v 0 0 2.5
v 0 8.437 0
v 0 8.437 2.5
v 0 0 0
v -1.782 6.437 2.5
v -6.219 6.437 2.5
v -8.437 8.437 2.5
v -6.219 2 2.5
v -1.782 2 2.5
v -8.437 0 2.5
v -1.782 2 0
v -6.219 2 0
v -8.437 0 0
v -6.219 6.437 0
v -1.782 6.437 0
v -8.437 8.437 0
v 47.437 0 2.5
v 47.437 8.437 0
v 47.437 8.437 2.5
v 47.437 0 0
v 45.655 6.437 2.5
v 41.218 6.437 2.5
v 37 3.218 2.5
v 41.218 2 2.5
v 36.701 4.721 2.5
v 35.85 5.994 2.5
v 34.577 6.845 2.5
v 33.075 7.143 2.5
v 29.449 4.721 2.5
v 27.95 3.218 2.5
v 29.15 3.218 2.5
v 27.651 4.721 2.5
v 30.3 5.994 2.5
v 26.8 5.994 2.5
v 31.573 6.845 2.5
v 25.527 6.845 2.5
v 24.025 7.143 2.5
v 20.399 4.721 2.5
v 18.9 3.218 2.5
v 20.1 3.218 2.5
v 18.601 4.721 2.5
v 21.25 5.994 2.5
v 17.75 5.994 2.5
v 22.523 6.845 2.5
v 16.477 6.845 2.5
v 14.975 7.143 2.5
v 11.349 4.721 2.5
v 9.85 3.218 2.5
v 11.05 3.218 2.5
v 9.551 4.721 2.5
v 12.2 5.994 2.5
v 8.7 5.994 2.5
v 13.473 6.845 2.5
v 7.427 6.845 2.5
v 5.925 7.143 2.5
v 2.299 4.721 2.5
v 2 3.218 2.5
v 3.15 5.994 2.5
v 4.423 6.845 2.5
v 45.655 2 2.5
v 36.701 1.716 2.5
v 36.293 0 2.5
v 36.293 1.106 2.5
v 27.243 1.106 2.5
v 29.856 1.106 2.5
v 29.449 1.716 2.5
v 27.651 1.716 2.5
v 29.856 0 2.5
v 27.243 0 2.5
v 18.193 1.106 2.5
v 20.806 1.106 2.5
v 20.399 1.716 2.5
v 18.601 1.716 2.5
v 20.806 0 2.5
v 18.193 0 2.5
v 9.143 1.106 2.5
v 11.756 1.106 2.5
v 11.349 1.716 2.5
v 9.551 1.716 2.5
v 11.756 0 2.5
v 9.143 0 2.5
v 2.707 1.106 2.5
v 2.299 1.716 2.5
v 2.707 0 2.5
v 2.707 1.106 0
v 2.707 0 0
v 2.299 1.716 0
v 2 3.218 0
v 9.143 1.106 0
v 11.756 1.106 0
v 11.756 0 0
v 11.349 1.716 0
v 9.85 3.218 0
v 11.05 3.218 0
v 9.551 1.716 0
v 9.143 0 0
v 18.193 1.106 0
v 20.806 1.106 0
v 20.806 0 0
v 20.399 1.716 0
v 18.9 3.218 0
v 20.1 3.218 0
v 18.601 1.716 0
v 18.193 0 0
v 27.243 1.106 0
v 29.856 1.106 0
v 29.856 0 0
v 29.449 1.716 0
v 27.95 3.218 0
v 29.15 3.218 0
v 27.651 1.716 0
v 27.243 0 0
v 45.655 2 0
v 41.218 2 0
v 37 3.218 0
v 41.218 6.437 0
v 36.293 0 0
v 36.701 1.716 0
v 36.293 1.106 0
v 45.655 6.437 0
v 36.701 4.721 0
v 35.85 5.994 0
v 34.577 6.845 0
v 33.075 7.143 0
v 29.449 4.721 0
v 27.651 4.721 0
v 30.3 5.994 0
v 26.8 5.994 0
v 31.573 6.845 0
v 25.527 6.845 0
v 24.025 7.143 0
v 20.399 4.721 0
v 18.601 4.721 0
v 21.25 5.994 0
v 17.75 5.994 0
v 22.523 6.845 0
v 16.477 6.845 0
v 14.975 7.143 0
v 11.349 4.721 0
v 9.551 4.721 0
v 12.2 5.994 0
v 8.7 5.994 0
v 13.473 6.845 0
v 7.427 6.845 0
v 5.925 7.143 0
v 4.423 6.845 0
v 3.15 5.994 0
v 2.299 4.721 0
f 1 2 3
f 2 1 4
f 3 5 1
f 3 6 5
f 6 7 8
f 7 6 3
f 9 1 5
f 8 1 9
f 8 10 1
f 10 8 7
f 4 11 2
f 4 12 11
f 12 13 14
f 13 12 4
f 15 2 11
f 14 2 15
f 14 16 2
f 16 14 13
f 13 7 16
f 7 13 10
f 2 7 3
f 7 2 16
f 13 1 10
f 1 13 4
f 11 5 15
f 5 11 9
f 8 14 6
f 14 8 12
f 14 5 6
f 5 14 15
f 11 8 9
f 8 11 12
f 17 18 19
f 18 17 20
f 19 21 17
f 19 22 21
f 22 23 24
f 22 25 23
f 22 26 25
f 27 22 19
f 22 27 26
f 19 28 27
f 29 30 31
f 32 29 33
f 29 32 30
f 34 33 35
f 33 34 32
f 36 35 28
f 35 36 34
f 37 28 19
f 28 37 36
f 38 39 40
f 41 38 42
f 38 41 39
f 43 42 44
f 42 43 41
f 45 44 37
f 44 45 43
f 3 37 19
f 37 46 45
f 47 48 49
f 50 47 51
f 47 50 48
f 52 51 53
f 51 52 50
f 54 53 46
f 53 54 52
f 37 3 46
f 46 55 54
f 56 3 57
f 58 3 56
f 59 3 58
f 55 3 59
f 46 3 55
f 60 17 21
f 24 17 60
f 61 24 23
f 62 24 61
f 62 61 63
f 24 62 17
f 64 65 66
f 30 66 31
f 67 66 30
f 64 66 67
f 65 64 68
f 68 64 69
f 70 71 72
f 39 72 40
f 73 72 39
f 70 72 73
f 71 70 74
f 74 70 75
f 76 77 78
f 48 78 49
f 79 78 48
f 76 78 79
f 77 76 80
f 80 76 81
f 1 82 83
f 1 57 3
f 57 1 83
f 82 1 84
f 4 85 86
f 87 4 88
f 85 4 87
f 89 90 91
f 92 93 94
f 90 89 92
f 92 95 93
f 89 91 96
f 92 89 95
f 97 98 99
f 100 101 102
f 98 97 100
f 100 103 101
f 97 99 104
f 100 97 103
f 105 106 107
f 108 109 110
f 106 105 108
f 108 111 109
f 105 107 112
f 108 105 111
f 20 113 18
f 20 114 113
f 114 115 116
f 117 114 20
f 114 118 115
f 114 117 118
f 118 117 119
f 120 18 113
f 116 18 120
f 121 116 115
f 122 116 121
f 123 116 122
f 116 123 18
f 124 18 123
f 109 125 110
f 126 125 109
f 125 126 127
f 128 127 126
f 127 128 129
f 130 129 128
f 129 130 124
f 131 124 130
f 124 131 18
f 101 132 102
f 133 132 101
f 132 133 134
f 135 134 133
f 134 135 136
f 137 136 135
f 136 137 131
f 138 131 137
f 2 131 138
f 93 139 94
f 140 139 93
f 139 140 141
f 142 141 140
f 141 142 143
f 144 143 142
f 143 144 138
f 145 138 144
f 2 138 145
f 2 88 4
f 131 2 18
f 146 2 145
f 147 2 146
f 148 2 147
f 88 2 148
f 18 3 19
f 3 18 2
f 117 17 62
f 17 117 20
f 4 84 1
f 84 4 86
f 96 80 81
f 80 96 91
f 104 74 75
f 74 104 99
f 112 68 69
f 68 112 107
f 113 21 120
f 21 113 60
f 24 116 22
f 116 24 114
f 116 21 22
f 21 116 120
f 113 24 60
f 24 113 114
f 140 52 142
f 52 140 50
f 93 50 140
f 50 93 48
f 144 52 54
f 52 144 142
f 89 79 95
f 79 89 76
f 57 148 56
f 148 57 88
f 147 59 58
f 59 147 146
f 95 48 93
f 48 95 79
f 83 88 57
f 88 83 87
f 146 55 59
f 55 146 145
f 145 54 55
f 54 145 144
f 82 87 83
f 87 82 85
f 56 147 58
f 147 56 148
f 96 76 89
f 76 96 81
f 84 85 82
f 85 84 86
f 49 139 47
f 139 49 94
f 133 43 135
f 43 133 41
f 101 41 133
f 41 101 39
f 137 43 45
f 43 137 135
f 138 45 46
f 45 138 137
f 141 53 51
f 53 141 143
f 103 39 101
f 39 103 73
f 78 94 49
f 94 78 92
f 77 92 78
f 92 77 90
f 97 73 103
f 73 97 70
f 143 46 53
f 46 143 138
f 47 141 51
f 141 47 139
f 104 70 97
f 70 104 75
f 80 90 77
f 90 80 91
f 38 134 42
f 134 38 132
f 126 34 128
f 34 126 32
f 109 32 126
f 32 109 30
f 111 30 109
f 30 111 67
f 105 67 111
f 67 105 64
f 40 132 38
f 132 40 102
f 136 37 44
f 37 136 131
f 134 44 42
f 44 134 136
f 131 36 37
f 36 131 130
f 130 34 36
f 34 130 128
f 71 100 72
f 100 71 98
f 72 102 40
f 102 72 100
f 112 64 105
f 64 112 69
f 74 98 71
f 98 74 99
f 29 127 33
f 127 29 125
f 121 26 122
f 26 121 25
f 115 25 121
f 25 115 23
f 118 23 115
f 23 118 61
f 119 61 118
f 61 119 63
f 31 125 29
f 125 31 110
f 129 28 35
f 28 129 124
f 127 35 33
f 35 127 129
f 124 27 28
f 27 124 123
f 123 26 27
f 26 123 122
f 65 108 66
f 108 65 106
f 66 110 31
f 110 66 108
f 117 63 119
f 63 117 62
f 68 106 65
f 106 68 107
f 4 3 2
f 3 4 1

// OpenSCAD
// in mm
dia=7.85;

count=4;

// in mm
spacing=1.2;

// in mm
border=2;

// percent of wire that extends beyond clip
reveal=18;

// in mm

// in mm
thickness=2.5;

/* [hidden] */
tab_size=(dia*(100-reveal)/100)+border;
tab_hole=tab_size-(border*2);

module clip_thing() {
	tab_thickness=thickness;//border;
	difference() {
		cube([tab_size,tab_size,tab_thickness]);
		translate([tab_hole/2,border,-1]) cube([tab_hole,tab_hole,tab_thickness+2]);
	}
}

union() {
	translate([-tab_size,0,0]) clip_thing();
	translate([(count*dia)+((count-1)*spacing)+(border*2),0,0]) clip_thing();

	difference() { // the clip
		cube([(count*dia)+((count-1)*spacing)+(border*2),(dia*(100-reveal)/100)+(border),thickness]); // the body
		translate([(border+(dia/2)),((dia/2)*(100-reveal)/100),0]) for(x=[0:count-1]){ // the wires
			translate([x*(dia+spacing),0,-1]) cylinder(r=dia/2,h=thickness+2,$fn=16); // a wire
			echo("wire min clip width=",(dia*(100-reveal)/100));
			translate([(x*(dia+spacing))-((dia*(100-reveal)/100)/2),-dia,-1]) cube([(dia*(100-reveal)/100),dia,thickness+2]); // cut off sharp edges
		}
	}
}
